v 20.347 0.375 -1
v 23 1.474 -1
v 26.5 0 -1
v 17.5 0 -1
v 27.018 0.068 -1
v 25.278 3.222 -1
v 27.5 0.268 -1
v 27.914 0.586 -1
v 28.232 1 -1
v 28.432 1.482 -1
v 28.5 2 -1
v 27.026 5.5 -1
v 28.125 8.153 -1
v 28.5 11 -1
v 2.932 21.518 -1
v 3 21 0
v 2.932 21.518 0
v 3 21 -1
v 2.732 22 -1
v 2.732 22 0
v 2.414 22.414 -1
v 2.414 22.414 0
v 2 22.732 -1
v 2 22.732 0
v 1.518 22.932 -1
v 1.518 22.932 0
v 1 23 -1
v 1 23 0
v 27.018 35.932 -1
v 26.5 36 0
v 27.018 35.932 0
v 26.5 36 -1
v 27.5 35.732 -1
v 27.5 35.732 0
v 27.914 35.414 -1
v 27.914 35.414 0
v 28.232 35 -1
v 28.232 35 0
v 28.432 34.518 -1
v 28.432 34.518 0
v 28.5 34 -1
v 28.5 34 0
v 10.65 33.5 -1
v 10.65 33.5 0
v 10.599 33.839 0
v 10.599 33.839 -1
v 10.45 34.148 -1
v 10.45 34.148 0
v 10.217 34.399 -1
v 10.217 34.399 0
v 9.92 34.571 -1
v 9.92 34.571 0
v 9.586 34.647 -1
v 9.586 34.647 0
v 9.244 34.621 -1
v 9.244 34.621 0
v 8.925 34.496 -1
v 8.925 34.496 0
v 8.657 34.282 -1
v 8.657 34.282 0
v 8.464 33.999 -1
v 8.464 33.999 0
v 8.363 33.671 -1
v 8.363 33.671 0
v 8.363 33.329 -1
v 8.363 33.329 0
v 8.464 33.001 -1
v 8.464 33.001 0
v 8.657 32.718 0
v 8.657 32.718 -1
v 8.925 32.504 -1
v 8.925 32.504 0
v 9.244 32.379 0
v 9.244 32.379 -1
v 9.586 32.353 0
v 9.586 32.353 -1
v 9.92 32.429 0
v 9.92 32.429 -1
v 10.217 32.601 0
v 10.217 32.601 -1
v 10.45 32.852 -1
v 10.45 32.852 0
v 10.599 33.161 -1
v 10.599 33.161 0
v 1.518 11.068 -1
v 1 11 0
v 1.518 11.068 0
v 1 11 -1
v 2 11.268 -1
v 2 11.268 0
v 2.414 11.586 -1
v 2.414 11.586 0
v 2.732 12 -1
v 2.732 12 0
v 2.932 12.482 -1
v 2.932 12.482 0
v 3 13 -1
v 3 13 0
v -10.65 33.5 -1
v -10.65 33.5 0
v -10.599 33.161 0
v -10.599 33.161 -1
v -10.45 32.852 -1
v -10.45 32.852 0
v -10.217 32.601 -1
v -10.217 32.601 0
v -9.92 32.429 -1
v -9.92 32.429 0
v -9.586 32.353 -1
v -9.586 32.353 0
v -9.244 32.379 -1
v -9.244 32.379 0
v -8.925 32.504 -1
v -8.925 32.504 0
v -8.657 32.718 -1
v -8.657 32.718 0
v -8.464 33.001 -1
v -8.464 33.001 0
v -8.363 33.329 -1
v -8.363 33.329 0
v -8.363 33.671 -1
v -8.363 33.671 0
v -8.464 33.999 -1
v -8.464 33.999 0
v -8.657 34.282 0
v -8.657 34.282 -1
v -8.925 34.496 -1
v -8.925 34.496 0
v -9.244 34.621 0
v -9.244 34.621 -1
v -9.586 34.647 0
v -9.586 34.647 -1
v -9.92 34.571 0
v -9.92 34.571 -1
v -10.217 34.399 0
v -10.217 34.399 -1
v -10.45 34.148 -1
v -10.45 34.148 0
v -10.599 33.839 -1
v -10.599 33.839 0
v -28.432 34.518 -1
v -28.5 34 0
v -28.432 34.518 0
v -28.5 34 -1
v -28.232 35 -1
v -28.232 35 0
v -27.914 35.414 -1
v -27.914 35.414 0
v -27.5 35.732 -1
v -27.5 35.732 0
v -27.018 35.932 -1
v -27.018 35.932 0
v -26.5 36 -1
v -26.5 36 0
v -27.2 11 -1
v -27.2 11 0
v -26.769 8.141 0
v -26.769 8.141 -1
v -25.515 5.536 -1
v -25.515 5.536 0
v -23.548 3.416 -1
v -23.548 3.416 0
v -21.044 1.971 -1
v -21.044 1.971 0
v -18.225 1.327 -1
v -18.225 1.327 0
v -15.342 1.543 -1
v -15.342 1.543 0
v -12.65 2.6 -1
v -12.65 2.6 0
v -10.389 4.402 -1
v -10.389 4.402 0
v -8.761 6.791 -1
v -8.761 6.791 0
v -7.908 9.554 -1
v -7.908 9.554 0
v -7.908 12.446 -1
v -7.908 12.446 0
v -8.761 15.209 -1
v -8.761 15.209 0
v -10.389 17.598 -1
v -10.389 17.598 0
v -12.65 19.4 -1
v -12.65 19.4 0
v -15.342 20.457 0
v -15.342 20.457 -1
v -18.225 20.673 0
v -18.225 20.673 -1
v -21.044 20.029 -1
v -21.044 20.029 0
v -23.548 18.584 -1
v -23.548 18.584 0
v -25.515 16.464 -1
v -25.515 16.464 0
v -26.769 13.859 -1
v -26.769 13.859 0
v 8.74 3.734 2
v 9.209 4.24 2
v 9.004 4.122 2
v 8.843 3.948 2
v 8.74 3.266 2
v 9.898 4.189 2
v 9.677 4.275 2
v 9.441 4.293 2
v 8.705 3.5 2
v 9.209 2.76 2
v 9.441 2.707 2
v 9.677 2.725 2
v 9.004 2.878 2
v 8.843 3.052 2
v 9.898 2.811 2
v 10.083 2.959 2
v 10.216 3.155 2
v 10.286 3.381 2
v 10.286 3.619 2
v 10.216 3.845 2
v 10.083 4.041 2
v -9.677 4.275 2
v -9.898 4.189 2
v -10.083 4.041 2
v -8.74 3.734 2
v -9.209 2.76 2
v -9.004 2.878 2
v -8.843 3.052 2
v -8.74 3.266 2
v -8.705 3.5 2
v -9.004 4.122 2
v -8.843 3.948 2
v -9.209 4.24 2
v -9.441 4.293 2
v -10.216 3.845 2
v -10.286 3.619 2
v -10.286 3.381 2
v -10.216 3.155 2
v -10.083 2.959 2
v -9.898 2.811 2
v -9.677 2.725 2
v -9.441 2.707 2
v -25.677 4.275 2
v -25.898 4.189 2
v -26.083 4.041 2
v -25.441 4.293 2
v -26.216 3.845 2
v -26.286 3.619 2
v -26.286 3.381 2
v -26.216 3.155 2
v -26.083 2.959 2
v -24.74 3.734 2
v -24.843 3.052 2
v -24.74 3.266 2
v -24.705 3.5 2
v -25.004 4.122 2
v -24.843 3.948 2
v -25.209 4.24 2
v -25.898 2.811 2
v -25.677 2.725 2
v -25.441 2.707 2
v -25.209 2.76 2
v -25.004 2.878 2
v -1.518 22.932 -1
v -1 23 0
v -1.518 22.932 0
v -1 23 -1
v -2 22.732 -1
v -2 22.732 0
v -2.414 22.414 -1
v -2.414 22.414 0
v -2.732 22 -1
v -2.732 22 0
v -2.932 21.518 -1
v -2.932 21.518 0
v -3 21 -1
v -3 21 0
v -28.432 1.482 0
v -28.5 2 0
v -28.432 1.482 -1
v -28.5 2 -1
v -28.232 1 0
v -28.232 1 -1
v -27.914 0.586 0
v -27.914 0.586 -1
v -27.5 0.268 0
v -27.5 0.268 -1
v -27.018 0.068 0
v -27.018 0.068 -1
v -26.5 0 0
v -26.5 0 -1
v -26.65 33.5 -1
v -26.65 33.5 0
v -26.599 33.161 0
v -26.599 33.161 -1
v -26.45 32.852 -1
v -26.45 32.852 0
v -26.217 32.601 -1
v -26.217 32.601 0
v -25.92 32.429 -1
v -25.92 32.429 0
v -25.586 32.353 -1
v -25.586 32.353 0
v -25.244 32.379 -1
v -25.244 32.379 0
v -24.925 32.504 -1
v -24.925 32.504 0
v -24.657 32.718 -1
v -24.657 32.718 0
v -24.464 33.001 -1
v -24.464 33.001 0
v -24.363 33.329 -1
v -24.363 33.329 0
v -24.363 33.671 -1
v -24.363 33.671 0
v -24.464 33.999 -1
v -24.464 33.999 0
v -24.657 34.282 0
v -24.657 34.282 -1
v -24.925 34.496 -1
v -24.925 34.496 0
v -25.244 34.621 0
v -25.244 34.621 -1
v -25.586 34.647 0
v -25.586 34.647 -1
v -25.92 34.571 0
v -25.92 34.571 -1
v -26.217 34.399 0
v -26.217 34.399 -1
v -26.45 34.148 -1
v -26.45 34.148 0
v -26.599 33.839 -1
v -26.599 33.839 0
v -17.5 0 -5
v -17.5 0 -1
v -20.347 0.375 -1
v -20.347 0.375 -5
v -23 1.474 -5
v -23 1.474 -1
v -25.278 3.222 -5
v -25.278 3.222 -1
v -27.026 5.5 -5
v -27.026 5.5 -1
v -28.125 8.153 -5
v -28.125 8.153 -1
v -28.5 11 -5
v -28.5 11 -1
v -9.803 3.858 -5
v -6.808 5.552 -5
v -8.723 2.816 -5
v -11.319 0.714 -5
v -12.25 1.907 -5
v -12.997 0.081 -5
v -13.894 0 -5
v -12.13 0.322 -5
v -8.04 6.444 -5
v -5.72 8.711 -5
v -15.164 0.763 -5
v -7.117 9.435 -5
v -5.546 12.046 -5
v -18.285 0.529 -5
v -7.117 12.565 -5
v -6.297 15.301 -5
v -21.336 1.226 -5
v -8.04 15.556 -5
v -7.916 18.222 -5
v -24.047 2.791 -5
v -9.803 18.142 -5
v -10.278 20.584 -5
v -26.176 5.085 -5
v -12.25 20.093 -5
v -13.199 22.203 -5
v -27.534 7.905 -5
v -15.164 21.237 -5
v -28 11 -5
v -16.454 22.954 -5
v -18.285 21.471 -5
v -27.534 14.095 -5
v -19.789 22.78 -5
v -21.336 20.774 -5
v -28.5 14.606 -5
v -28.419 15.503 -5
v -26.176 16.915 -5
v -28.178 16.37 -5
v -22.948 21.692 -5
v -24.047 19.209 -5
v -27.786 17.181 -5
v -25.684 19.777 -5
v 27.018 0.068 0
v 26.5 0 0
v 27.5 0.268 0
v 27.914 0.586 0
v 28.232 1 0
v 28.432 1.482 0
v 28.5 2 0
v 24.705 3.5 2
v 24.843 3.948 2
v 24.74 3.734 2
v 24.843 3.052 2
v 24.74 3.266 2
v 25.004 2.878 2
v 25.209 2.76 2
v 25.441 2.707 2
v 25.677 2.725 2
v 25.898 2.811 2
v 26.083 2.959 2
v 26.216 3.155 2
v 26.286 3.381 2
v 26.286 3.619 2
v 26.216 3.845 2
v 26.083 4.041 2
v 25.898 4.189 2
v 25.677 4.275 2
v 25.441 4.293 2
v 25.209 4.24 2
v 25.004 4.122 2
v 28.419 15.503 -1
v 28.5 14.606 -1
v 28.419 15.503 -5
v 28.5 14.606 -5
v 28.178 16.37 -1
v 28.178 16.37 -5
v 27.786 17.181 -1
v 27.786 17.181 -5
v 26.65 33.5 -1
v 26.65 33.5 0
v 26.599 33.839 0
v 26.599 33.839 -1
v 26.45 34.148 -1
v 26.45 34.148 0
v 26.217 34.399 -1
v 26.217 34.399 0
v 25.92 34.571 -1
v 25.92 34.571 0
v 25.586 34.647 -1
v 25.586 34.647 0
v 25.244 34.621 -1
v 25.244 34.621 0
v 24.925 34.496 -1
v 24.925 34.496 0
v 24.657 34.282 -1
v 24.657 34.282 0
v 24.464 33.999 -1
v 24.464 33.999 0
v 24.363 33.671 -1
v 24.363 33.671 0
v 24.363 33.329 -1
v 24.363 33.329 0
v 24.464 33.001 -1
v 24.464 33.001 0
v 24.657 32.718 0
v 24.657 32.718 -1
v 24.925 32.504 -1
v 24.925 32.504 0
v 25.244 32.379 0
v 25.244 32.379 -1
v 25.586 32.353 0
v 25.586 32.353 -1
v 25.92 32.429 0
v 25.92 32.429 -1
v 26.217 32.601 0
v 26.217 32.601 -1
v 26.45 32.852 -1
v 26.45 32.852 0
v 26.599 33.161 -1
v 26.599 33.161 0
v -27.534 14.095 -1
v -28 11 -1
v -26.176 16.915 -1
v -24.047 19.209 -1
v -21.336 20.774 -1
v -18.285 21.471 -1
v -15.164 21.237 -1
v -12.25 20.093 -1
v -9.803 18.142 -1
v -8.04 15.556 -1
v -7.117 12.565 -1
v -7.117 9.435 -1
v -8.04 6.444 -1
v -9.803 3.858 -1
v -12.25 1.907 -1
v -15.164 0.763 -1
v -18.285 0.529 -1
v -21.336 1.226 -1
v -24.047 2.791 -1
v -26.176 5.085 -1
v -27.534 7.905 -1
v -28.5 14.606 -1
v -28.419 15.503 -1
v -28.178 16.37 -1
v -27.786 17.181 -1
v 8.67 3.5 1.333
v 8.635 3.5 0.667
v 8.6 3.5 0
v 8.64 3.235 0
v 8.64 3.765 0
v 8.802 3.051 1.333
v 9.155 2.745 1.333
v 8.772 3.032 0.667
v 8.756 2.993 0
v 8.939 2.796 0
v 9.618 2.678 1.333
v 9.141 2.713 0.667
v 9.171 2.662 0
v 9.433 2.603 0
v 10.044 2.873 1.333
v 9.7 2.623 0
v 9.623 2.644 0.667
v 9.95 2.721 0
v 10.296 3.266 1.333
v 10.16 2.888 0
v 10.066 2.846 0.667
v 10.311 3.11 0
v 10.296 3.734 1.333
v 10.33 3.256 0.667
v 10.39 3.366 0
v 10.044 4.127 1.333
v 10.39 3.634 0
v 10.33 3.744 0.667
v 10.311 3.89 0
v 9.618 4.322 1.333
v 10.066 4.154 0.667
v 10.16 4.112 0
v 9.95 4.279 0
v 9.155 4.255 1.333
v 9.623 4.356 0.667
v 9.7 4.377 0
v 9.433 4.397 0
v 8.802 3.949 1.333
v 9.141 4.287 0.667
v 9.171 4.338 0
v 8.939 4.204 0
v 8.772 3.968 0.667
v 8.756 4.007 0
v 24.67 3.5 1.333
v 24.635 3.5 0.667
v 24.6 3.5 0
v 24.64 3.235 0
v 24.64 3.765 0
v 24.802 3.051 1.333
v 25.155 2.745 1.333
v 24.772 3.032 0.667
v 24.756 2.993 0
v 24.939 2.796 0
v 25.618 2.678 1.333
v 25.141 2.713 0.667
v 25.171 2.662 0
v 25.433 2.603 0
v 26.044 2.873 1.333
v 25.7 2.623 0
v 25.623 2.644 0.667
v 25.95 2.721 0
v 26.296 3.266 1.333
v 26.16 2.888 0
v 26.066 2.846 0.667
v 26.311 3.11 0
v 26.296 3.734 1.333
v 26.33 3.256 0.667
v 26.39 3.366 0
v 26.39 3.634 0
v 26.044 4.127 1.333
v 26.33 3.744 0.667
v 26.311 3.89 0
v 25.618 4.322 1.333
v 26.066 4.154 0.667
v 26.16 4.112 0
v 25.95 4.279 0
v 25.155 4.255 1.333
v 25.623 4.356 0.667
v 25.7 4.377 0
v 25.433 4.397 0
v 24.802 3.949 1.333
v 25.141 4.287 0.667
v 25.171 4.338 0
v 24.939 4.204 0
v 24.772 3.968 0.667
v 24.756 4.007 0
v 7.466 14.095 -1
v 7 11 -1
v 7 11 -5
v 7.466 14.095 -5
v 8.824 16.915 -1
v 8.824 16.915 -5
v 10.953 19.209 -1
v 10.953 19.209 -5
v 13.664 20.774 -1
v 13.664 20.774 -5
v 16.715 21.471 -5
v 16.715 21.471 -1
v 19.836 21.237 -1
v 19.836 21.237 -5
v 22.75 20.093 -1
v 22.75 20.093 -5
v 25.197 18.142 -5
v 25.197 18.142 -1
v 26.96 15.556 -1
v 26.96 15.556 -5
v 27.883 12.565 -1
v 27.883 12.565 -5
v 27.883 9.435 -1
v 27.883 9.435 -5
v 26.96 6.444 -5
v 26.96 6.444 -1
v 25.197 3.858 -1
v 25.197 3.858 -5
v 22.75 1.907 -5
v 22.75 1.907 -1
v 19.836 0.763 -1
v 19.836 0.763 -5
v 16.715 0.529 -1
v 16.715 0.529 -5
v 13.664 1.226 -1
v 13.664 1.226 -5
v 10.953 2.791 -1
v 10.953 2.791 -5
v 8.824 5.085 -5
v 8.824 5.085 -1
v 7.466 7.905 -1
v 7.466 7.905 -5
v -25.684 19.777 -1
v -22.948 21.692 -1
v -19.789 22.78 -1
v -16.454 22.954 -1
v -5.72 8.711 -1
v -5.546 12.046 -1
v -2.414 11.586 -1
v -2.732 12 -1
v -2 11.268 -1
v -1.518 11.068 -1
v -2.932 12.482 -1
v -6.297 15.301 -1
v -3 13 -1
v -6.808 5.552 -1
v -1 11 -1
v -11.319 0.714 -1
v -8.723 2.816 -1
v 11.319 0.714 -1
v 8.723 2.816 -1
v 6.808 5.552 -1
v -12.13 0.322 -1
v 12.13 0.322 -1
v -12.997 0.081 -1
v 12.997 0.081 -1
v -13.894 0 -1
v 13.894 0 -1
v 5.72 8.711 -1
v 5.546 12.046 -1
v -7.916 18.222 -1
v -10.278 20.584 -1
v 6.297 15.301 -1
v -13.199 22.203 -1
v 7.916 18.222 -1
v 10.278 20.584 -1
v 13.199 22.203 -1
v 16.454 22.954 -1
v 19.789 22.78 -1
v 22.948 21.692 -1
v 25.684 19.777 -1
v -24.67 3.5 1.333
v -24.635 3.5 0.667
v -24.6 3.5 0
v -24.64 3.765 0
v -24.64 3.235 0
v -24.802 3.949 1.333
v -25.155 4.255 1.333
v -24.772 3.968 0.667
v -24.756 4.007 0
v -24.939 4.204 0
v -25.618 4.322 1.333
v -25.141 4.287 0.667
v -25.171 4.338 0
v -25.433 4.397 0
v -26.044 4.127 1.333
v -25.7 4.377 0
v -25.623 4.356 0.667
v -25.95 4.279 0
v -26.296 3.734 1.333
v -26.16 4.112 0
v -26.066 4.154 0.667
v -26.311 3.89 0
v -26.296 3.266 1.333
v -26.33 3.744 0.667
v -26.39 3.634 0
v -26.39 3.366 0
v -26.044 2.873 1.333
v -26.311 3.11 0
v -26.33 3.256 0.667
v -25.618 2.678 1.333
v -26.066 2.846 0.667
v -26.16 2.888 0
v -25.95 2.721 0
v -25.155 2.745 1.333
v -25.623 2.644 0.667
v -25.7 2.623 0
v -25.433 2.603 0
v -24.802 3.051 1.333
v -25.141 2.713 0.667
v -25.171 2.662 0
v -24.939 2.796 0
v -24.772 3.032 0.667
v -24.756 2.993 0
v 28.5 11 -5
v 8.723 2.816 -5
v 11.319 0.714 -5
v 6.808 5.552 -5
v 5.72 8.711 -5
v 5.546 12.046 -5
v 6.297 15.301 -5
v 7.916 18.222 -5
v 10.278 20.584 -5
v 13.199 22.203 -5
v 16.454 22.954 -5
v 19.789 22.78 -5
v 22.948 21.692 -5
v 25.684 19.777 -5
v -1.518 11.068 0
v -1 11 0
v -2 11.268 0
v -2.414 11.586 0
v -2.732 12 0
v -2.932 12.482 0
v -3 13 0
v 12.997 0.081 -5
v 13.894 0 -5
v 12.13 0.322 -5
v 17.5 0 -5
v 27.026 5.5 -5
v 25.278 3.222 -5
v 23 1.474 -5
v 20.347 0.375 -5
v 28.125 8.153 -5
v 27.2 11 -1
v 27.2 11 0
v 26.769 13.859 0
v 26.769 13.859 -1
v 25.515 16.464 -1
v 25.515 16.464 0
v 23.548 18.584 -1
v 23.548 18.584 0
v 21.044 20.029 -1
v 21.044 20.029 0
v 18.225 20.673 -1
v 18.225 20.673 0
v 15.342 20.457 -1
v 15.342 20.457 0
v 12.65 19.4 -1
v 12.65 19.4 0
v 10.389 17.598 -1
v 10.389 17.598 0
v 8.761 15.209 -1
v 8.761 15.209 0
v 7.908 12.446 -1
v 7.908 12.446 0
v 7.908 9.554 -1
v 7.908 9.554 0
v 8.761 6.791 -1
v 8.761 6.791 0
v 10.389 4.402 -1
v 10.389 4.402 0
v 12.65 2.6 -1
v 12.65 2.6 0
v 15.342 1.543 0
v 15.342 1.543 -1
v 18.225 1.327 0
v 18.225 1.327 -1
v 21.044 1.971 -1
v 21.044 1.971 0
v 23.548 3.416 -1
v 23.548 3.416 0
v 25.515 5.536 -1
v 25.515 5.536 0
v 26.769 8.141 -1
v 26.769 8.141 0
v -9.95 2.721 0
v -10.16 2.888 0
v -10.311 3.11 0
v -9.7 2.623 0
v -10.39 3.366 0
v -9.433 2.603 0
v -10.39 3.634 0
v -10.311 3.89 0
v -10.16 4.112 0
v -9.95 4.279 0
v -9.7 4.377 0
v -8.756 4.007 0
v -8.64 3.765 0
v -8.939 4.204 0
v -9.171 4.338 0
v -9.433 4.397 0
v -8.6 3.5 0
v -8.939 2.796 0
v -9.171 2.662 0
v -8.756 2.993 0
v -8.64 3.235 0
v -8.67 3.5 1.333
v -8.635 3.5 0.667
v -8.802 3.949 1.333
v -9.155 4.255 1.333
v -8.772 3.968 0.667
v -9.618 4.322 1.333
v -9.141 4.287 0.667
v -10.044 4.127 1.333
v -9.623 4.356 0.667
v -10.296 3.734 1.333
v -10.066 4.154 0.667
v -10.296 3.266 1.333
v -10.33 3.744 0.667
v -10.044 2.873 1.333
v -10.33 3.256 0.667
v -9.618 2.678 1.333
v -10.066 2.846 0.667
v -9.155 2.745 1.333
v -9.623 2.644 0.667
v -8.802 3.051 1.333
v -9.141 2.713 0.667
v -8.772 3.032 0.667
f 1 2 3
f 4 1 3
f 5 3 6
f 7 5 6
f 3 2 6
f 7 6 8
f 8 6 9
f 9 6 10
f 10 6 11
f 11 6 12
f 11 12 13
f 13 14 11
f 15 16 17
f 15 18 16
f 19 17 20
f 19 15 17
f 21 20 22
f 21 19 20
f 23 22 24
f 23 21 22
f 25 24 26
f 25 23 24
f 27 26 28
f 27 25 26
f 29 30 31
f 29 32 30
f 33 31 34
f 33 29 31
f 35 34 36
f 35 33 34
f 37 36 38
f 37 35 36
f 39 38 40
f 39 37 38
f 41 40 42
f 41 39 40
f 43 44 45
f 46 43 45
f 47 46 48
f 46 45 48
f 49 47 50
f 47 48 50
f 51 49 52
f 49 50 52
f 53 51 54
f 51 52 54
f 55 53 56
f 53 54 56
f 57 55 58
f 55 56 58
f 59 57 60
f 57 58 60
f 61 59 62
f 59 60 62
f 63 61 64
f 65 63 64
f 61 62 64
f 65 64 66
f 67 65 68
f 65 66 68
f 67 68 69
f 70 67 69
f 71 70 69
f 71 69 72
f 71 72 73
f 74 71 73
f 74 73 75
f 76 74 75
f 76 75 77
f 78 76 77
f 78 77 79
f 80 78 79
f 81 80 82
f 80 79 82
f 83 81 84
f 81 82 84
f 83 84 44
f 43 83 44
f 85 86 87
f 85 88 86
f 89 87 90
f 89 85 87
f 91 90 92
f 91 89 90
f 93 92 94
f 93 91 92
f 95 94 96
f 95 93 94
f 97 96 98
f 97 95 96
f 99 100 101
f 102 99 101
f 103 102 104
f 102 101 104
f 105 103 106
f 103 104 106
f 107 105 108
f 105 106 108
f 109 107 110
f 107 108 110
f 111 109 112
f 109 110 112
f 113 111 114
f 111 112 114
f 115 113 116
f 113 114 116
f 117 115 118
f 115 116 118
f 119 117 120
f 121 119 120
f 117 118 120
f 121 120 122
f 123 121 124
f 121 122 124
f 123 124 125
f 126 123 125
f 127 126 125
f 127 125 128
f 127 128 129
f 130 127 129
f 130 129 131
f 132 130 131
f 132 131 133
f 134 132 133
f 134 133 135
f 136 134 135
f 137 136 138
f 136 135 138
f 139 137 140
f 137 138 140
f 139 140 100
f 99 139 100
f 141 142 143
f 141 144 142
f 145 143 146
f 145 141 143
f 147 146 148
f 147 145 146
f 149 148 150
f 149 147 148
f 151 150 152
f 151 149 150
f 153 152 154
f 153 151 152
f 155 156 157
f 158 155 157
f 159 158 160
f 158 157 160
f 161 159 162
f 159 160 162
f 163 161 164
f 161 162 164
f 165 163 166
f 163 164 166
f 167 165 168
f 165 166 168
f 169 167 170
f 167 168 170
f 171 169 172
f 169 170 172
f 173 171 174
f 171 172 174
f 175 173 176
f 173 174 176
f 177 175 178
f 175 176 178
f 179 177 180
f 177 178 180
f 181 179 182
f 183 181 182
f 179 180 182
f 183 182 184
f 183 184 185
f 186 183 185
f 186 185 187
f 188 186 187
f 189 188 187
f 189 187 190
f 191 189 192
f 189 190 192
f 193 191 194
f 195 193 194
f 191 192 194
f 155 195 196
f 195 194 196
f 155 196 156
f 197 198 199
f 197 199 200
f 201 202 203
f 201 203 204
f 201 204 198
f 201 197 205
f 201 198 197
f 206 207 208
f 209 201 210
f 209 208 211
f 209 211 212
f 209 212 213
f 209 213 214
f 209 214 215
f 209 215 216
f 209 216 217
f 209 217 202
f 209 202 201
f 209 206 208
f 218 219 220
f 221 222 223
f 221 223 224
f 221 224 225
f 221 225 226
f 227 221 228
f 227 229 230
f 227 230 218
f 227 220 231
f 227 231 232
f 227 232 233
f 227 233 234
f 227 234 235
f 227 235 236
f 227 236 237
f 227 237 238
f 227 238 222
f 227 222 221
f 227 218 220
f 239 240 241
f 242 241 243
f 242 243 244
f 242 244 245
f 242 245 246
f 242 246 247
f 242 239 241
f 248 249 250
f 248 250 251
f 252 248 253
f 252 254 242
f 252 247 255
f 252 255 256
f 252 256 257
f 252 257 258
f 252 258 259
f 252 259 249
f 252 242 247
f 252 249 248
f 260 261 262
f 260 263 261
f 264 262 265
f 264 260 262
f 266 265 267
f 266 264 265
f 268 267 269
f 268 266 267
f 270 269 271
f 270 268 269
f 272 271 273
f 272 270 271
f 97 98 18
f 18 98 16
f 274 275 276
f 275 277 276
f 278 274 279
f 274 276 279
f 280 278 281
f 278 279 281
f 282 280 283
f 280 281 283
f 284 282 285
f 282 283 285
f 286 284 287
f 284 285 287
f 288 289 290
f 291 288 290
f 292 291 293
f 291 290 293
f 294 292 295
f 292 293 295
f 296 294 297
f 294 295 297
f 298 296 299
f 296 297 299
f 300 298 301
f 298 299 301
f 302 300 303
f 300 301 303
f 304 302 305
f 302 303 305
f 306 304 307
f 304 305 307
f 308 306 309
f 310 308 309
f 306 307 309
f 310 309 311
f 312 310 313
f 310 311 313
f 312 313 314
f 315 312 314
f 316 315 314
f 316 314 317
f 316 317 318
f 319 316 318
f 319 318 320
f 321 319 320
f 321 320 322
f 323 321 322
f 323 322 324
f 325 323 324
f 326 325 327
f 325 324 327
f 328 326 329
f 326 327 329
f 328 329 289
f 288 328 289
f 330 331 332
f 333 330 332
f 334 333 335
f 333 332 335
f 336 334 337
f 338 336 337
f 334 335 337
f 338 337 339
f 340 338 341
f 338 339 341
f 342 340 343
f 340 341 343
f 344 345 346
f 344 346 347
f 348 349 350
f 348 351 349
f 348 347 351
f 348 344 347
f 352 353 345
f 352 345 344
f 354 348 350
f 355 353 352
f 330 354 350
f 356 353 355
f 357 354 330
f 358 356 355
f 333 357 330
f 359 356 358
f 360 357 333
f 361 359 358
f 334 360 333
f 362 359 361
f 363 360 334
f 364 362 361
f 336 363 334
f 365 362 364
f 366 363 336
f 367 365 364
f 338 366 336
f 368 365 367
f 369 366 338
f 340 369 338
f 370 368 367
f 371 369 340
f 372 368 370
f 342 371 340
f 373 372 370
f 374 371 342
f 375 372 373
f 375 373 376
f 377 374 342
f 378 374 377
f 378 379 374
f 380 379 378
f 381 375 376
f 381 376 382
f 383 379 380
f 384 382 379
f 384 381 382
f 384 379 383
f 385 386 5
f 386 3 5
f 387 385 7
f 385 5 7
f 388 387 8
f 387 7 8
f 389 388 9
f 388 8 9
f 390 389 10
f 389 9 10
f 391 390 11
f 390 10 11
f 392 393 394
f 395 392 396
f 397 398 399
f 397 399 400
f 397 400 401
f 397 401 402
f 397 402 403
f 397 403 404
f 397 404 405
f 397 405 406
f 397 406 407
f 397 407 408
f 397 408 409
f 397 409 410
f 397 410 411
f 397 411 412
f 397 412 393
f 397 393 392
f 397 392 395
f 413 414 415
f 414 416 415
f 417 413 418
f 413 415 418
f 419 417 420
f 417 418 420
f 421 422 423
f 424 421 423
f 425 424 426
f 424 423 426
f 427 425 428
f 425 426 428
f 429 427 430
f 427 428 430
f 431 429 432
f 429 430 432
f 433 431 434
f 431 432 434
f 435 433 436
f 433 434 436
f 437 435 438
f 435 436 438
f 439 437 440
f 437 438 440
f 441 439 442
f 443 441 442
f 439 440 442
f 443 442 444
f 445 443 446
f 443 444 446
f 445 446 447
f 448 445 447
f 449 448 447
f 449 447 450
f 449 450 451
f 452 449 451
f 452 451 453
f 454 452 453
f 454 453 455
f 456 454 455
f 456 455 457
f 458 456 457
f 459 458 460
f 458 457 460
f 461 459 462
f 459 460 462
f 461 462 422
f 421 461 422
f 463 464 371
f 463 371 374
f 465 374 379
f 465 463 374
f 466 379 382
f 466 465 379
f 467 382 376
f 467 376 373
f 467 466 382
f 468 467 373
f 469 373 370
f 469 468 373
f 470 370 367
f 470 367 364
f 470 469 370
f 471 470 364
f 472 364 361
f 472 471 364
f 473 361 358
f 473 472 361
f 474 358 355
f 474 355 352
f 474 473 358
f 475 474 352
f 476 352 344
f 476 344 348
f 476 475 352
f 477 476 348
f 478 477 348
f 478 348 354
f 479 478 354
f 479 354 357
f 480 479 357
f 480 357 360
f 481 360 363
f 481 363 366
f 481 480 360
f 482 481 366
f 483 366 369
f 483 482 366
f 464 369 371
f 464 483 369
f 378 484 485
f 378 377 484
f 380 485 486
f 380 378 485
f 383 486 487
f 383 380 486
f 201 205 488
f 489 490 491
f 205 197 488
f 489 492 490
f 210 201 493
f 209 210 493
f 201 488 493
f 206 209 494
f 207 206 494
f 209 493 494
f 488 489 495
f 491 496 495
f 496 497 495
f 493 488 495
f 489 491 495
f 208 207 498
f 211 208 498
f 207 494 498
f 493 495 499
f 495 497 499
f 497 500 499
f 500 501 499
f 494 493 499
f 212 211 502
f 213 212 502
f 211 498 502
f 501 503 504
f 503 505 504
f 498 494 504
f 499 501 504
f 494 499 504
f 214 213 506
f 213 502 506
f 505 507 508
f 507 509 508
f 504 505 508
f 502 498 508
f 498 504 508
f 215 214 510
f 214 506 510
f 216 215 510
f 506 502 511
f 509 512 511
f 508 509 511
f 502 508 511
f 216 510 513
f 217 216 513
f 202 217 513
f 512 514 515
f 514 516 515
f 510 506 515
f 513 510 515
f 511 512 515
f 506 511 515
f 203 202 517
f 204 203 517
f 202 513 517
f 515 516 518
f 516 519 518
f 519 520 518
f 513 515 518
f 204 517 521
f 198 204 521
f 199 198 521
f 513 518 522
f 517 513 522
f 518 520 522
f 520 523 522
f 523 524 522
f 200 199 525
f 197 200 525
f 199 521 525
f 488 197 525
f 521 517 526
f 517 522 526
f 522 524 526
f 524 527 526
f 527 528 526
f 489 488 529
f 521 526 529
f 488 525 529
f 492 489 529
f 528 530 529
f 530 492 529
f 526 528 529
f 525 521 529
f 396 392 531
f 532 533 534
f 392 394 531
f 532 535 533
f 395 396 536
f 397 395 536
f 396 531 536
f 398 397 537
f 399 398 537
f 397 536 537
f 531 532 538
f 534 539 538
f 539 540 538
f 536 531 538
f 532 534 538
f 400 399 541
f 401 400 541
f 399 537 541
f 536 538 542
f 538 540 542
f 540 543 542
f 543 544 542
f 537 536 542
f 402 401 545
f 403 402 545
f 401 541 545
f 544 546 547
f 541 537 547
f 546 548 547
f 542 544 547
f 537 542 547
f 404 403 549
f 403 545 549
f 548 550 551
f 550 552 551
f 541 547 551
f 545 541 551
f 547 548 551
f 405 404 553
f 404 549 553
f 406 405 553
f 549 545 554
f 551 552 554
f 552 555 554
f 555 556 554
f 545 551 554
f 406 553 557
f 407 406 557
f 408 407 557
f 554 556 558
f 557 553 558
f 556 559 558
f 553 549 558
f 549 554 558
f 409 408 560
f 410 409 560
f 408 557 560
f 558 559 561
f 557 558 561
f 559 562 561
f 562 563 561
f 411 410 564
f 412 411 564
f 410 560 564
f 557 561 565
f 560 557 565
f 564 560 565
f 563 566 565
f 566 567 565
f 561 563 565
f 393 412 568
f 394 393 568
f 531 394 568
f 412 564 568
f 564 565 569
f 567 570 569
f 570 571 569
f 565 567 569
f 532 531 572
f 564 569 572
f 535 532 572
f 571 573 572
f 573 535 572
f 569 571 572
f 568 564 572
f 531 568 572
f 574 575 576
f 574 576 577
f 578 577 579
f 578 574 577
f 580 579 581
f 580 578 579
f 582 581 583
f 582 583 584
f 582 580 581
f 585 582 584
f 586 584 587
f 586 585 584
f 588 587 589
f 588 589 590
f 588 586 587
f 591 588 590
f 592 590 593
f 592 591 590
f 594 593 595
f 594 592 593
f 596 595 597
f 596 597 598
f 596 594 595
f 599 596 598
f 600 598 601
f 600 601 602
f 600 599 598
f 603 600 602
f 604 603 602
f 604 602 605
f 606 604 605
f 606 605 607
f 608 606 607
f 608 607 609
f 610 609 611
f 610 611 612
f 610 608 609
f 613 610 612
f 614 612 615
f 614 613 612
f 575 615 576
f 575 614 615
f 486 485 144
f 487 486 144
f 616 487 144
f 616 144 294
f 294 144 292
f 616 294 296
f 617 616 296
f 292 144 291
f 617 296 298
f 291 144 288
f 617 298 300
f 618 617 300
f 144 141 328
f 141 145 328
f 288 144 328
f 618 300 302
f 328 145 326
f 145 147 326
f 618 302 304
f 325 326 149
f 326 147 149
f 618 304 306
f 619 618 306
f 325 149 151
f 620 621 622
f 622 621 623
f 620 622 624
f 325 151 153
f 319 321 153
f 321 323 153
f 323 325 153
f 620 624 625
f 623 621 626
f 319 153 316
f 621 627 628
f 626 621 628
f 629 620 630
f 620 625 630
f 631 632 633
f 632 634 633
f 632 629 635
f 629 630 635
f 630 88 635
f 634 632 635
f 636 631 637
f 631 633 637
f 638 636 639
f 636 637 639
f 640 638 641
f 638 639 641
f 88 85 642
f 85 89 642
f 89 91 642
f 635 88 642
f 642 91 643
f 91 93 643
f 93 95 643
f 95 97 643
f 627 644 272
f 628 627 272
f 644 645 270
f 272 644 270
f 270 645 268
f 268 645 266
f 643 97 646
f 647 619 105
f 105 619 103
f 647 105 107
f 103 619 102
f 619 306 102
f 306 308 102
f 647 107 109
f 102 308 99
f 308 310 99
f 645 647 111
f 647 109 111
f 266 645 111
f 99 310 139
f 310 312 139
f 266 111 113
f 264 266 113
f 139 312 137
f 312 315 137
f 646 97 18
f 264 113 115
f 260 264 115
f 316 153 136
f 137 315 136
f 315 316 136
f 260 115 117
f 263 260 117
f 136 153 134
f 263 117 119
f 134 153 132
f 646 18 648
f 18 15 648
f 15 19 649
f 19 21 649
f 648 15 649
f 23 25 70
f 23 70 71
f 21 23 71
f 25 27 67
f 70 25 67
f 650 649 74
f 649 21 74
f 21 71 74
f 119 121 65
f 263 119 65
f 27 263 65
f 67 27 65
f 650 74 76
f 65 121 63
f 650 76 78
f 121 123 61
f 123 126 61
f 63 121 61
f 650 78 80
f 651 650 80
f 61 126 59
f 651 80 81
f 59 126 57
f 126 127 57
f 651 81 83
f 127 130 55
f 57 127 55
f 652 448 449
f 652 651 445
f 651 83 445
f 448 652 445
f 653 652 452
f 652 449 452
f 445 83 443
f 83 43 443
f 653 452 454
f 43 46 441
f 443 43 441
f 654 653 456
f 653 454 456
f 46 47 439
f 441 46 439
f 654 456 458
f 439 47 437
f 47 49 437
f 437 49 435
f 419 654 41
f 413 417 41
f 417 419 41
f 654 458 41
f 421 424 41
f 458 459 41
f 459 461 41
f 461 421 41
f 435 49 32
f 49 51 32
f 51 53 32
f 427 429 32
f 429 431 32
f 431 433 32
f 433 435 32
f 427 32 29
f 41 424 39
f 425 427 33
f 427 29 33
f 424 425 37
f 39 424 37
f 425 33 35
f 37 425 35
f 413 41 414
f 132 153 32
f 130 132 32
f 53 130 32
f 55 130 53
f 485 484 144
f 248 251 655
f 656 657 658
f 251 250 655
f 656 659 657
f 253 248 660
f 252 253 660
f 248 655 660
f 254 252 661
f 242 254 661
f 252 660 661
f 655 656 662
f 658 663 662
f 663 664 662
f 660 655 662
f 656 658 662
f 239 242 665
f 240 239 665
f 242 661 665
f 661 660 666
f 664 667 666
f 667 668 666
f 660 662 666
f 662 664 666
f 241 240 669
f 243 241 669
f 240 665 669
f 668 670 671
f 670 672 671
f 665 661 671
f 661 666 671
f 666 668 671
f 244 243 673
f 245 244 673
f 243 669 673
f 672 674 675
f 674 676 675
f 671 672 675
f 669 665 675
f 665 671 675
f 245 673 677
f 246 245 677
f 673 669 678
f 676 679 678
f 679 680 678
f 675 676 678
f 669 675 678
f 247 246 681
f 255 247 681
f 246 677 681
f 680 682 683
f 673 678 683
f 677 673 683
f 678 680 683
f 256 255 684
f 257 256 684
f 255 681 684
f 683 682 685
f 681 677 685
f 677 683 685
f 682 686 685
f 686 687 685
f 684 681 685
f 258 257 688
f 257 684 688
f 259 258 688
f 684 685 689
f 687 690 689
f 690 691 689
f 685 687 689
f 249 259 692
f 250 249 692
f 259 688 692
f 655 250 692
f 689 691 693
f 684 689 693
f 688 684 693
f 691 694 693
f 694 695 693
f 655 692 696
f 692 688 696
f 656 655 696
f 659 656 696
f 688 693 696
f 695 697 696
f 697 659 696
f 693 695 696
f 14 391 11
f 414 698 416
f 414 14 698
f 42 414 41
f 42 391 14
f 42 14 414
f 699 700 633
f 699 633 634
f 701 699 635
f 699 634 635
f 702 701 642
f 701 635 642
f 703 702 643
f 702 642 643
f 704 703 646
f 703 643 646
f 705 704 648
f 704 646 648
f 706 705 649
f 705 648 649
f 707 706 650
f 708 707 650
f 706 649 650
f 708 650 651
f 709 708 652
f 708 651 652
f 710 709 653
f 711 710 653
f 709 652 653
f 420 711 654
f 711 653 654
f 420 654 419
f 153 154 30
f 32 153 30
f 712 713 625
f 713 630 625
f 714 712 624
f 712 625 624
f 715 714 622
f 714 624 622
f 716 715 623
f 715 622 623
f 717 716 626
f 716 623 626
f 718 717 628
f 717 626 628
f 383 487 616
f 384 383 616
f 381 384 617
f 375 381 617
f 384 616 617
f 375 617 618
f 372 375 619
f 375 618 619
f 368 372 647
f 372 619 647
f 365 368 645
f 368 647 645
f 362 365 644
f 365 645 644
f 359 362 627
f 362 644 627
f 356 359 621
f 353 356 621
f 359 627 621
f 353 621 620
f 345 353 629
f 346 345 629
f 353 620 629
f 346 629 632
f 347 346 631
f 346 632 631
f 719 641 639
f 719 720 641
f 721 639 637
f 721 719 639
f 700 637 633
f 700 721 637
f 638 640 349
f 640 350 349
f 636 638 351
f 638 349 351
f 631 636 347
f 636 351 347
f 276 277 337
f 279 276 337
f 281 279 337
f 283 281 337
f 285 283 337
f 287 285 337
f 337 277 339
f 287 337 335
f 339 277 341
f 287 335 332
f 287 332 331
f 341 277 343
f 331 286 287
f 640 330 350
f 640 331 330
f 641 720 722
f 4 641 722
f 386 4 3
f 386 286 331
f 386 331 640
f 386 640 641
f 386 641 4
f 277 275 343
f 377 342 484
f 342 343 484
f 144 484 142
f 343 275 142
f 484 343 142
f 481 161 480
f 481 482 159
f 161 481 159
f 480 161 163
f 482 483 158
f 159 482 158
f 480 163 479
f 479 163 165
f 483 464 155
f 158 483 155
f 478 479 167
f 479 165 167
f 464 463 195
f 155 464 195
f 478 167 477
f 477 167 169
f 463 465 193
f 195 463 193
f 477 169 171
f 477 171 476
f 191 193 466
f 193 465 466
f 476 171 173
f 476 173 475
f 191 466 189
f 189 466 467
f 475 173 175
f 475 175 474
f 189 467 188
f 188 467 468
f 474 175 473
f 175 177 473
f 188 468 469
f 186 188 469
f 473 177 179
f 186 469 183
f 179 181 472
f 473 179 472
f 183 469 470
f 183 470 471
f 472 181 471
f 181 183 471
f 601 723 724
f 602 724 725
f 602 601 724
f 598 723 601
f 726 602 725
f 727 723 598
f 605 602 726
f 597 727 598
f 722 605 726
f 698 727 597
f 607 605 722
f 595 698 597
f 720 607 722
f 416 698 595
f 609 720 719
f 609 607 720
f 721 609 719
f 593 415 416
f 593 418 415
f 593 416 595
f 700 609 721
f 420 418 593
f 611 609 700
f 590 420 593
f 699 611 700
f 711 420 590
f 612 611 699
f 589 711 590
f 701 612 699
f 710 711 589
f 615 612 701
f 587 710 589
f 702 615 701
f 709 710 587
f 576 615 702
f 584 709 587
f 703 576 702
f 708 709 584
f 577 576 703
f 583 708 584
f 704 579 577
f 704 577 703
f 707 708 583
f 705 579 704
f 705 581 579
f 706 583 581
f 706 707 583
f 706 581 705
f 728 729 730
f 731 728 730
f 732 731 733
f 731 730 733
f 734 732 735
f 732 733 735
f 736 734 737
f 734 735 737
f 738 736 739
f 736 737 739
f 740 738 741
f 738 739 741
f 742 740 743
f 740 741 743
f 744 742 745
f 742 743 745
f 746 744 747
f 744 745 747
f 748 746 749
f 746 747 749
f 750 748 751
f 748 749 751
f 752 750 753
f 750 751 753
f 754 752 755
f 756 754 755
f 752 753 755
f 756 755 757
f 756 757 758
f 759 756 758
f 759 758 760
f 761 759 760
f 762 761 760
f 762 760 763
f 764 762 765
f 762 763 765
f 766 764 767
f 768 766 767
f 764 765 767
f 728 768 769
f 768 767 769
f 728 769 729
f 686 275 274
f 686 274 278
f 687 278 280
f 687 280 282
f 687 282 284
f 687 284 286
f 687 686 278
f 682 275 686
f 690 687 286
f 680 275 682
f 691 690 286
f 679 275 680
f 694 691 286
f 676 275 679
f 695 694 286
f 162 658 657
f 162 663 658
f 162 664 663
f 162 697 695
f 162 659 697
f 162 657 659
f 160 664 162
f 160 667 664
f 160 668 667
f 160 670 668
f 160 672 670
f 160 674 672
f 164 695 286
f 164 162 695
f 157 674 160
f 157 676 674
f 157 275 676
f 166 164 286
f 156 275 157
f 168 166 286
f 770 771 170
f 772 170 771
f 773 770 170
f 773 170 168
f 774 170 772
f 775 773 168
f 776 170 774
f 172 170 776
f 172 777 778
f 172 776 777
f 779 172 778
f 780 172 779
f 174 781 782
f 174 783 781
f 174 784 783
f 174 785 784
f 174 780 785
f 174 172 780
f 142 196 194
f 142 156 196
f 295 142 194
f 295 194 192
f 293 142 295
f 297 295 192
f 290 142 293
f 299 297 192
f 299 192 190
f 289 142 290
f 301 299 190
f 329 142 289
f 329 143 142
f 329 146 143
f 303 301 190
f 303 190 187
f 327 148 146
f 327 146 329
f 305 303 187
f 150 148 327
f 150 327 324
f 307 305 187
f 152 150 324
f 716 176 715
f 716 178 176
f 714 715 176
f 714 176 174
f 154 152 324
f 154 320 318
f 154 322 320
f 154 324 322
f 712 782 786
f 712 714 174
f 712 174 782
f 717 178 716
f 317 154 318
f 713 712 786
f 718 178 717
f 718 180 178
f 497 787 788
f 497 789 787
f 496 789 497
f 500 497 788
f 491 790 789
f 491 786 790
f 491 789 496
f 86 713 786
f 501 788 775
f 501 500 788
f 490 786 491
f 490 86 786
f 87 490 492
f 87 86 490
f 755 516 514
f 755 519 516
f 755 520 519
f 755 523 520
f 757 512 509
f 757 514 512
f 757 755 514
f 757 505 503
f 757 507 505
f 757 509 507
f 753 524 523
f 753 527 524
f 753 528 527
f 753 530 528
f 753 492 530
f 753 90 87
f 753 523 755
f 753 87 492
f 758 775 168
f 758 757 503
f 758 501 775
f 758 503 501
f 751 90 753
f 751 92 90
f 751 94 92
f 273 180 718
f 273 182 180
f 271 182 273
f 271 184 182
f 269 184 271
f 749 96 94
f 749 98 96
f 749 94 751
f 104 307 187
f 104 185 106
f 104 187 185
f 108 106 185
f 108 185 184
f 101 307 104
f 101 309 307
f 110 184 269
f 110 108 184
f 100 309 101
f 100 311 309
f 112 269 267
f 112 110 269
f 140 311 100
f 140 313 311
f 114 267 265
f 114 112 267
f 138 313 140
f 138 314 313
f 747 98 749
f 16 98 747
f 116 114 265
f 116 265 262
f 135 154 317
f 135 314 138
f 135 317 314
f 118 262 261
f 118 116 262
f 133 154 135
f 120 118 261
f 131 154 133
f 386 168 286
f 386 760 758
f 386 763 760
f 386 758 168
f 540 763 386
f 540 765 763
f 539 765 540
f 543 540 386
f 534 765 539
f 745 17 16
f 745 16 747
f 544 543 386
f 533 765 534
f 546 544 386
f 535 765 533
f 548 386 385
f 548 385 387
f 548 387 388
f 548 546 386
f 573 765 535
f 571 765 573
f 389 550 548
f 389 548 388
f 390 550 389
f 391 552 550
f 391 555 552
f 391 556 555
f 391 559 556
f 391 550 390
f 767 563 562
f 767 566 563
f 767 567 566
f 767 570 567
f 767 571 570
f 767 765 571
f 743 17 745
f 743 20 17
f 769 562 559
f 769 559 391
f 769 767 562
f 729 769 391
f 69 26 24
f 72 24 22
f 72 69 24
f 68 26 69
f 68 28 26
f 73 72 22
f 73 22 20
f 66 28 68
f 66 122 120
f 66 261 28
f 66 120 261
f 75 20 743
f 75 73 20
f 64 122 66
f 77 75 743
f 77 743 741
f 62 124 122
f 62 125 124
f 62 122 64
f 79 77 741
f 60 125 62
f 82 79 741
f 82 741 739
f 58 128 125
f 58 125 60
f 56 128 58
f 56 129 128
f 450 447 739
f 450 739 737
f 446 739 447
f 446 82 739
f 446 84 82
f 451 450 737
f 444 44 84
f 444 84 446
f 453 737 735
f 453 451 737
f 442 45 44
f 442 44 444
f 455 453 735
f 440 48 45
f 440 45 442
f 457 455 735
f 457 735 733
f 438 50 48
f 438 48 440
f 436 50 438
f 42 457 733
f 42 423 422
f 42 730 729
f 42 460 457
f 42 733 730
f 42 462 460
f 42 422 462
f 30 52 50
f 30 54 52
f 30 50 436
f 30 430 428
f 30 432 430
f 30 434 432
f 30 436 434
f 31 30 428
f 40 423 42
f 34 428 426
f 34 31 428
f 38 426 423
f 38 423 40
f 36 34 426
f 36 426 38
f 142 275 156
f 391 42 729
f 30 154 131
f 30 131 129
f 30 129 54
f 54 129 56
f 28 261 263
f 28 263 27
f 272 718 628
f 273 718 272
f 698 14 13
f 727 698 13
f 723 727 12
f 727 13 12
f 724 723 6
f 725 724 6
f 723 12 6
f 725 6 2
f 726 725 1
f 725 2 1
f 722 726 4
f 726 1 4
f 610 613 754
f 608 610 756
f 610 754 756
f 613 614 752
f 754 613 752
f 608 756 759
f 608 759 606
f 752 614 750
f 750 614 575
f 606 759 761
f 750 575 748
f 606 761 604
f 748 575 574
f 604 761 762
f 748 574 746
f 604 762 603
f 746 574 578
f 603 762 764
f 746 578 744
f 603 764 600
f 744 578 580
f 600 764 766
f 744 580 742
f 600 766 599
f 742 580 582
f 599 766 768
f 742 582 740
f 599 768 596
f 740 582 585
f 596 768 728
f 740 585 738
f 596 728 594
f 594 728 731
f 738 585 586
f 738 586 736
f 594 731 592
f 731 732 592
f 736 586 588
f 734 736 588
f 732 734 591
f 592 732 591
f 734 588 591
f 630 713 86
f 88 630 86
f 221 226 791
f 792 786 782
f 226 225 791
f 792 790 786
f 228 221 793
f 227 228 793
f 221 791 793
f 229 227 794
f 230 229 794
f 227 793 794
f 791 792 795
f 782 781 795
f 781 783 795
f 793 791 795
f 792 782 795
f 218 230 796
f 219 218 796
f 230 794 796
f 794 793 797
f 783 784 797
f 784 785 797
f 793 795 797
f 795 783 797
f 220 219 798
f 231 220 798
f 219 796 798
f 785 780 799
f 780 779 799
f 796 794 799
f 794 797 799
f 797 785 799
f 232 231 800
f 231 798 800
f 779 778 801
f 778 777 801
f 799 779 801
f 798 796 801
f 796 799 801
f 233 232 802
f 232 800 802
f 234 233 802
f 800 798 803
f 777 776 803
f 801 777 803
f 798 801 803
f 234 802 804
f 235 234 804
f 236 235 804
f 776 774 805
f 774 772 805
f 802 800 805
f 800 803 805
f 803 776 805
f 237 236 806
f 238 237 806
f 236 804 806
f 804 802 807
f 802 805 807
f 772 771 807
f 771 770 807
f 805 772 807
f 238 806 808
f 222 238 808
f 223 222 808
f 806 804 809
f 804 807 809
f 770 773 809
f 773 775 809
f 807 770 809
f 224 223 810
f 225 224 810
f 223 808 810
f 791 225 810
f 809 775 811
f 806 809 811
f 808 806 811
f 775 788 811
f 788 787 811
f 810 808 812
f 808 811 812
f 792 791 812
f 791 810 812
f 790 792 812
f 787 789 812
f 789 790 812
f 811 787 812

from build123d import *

# Parameters (mm, degrees)
SKETCH_1_W                = 57
SKETCH_1_H                = 36
SKETCH_1_R                = 9.7
SKETCH_1_R_2              = 1.15
SKETCH_1_W_2              = 6
SKETCH_1_H_2              = 12
EXTRUDE_1_DEPTH           = 1
FILLET_1_R                = 2
FILLET_2_R                = 2
SKETCH_2_R                = 0.9
EXTRUDE_2_DEPTH           = 2
EXTRUDE_2_DRAFT           = 3
EXTRUDE_2_PROFILE_2_DEPTH = 2
EXTRUDE_2_PROFILE_2_DRAFT = 3
MIRROR_1_COPY_1_SKETCH_R  = 0.9
MIRROR_1_COPY_1_DEPTH     = 2
MIRROR_1_COPY_1_DRAFT     = 3
MIRROR_1_COPY_2_SKETCH_R  = 0.9
MIRROR_1_COPY_2_DEPTH     = 2
MIRROR_1_COPY_2_DRAFT     = 3
MIRROR_1_COPY_3_SKETCH_R  = 0.9
MIRROR_1_COPY_3_DEPTH     = 2
MIRROR_1_COPY_3_DRAFT     = 3
SKETCH_3_R                = 10.5
EXTRUDE_3_DEPTH           = 4
FILLET_3_R                = 5


with BuildPart() as part:
    # 草图1 → 凸台-拉伸1 (new body)
    with BuildSketch(Plane.XY):
        with Locations((0, 18)):
            Rectangle(SKETCH_1_W, SKETCH_1_H)
        with Locations((17.5, 11)):
            Circle(SKETCH_1_R, mode=Mode.SUBTRACT)
        with Locations(Location((-17.5, 11, 0), (0, 0, 180))):
            Circle(SKETCH_1_R, mode=Mode.SUBTRACT)
        with Locations((25.5, 33.5)):
            Circle(SKETCH_1_R_2, mode=Mode.SUBTRACT)
        with Locations((9.5, 33.5)):
            Circle(SKETCH_1_R_2, mode=Mode.SUBTRACT)
        with Locations(Location((-9.5, 33.5, 0), (0, 0, 180))):
            Circle(SKETCH_1_R_2, mode=Mode.SUBTRACT)
        with Locations(Location((-25.5, 33.5, 0), (0, 0, 180))):
            Circle(SKETCH_1_R_2, mode=Mode.SUBTRACT)
        with Locations((0, 17)):
            Rectangle(SKETCH_1_W_2, SKETCH_1_H_2, mode=Mode.SUBTRACT)
    extrude(amount=-EXTRUDE_1_DEPTH)

    # 圆角1
    fillet_1_edges = [part.edges().sort_by_distance(p)[0] for p in [
        (28.5, 0, -0.5),
        (-28.5, 0, -0.5),
        (-28.5, 36, -0.5),
        (28.5, 36, -0.5),
    ]]
    fillet(fillet_1_edges, radius=FILLET_1_R)

    # 圆角2
    fillet_2_edges = [part.edges().sort_by_distance(p)[0] for p in [
        (-3, 11, -0.5),
        (-3, 23, -0.5),
        (3, 23, -0.5),
        (3, 11, -0.5),
    ]]
    fillet(fillet_2_edges, radius=FILLET_2_R)


with BuildPart() as extrude_2_tool:
    # 草图2 → 凸台-拉伸2 (with draft: the straight prism first)
    with BuildSketch(Plane.XY):
        with Locations((-25.5, 3.5)):
            Circle(SKETCH_2_R)
    extrude(amount=EXTRUDE_2_DEPTH)
    # 凸台-拉伸2: the draft: its side faces are tilted about the plane it starts from
    extrude_2_sides = [extrude_2_tool.faces().sort_by_distance(p)[0] for p in [
        (-26.4, 3.5, 1),
    ]]
    draft(extrude_2_sides, Plane.XY, EXTRUDE_2_DRAFT)


with BuildPart() as part_1:
    add(part.part)

    # 凸台-拉伸2: add extrude_2_tool
    add(extrude_2_tool.part)


with BuildPart() as extrude_2_profile_2_tool:
    # 草图2 → 凸台-拉伸2 profile 2 (with draft: the straight prism first)
    with BuildSketch(Plane.XY):
        with Locations((-9.5, 3.5)):
            Circle(SKETCH_2_R)
    extrude(amount=EXTRUDE_2_PROFILE_2_DEPTH)
    # 凸台-拉伸2 profile 2: the draft: its side faces are tilted about the plane it starts from
    extrude_2_profile_2_sides = [extrude_2_profile_2_tool.faces().sort_by_distance(p)[0] for p in [
        (-10.4, 3.5, 1),
    ]]
    draft(extrude_2_profile_2_sides, Plane.XY, EXTRUDE_2_PROFILE_2_DRAFT)


with BuildPart() as part_2:
    add(part_1.part)

    # 凸台-拉伸2 profile 2: add extrude_2_profile_2_tool
    add(extrude_2_profile_2_tool.part)


with BuildPart() as mirror_1_copy_1_tool:
    # 镜向1 copy 1 sketch → 镜向1 copy 1 (with draft: the straight prism first)
    with BuildSketch(Plane(origin=(0, 0, 0), x_dir=(-1, 0, 0), z_dir=(0, 0, 1))):
        with Locations((-25.5, -3.5)):
            Circle(MIRROR_1_COPY_1_SKETCH_R)
    extrude(amount=MIRROR_1_COPY_1_DEPTH)
    # 镜向1 copy 1: the draft: its side faces are tilted about the plane it starts from
    mirror_1_copy_1_sides = [mirror_1_copy_1_tool.faces().sort_by_distance(p)[0] for p in [
        (26.4, 3.5, 1),
    ]]
    draft(mirror_1_copy_1_sides, Plane(origin=(0, 0, 0), x_dir=(-1, 0, 0), z_dir=(0, 0, 1)), MIRROR_1_COPY_1_DRAFT)


with BuildPart() as part_3:
    add(part_2.part)

    # 镜向1 copy 1: add mirror_1_copy_1_tool
    add(mirror_1_copy_1_tool.part)


with BuildPart() as mirror_1_copy_2_tool:
    # 镜向1 copy 2 sketch → 镜向1 copy 2 (with draft: the straight prism first)
    with BuildSketch(Plane(origin=(0, 0, 0), x_dir=(-1, 0, 0), z_dir=(0, 0, 1))):
        with Locations((-9.5, -3.5)):
            Circle(MIRROR_1_COPY_2_SKETCH_R)
    extrude(amount=MIRROR_1_COPY_2_DEPTH)
    # 镜向1 copy 2: the draft: its side faces are tilted about the plane it starts from
    mirror_1_copy_2_sides = [mirror_1_copy_2_tool.faces().sort_by_distance(p)[0] for p in [
        (10.4, 3.5, 1),
    ]]
    draft(mirror_1_copy_2_sides, Plane(origin=(0, 0, 0), x_dir=(-1, 0, 0), z_dir=(0, 0, 1)), MIRROR_1_COPY_2_DRAFT)


with BuildPart() as part_4:
    add(part_3.part)

    # 镜向1 copy 2: add mirror_1_copy_2_tool
    add(mirror_1_copy_2_tool.part)


with BuildPart() as mirror_1_copy_3_tool:
    # 镜向1 copy 3 sketch → 镜向1 copy 3 (with draft: the straight prism first)
    with BuildSketch(Plane(origin=(0, 0, 0), x_dir=(-1, 0, 0), z_dir=(0, 0, 1))):
        with Locations((-9.5, -3.5)):
            Circle(MIRROR_1_COPY_3_SKETCH_R)
    extrude(amount=MIRROR_1_COPY_3_DEPTH)
    # 镜向1 copy 3: the draft: its side faces are tilted about the plane it starts from
    mirror_1_copy_3_sides = [mirror_1_copy_3_tool.faces().sort_by_distance(p)[0] for p in [
        (10.4, 3.5, 1),
    ]]
    draft(mirror_1_copy_3_sides, Plane(origin=(0, 0, 0), x_dir=(-1, 0, 0), z_dir=(0, 0, 1)), MIRROR_1_COPY_3_DRAFT)


with BuildPart() as part_5:
    add(part_4.part)

    # 镜向1 copy 3: add mirror_1_copy_3_tool
    add(mirror_1_copy_3_tool.part)

    # 草图3 → 凸台-拉伸3 (add)
    # profile 1 of 2: a face of its own
    with BuildSketch(Plane(origin=(0, 0, -1), x_dir=(-1, 0, 0), z_dir=(0, 0, -1))):
        with BuildLine():
            ThreePointArc((-12.704168477, 0), (-9.014718626, 19.485281374), (-28.5, 15.795831523))
            Line((-28.5, 15.795831523), (-28.5, 11))
            ThreePointArc((-28.5, 11), (-25.278174593, 3.221825407), (-17.5, 0))
            Line((-17.5, 0), (-12.704168477, 0))
        make_face()
        with Locations((-17.5, 11)):
            Circle(SKETCH_3_R, mode=Mode.SUBTRACT)
    # profile 2 of 2: a face of its own
    with BuildSketch(Plane(origin=(0, 0, -1), x_dir=(-1, 0, 0), z_dir=(0, 0, -1))):
        with BuildLine():
            ThreePointArc((28.5, 15.795831523), (9.014718626, 19.485281374), (12.704168477, 0))
            Line((12.704168477, 0), (17.5, 0))
            ThreePointArc((17.5, 0), (25.278174593, 3.221825407), (28.5, 11))
            Line((28.5, 11), (28.5, 15.795831523))
        make_face()
        with Locations((17.5, 11)):
            Circle(SKETCH_3_R, mode=Mode.SUBTRACT)
    extrude(amount=EXTRUDE_3_DEPTH)

    # 圆角3
    fillet_3_edges = [part_5.edges().sort_by_distance(p)[0] for p in [
        (28.5, 15.795831523, -3),
        (12.704168477, 0, -3),
        (-12.704168477, 0, -3),
        (-28.5, 15.795831523, -3),
    ]]
    fillet(fillet_3_edges, radius=FILLET_3_R)


solid = part_5.part
